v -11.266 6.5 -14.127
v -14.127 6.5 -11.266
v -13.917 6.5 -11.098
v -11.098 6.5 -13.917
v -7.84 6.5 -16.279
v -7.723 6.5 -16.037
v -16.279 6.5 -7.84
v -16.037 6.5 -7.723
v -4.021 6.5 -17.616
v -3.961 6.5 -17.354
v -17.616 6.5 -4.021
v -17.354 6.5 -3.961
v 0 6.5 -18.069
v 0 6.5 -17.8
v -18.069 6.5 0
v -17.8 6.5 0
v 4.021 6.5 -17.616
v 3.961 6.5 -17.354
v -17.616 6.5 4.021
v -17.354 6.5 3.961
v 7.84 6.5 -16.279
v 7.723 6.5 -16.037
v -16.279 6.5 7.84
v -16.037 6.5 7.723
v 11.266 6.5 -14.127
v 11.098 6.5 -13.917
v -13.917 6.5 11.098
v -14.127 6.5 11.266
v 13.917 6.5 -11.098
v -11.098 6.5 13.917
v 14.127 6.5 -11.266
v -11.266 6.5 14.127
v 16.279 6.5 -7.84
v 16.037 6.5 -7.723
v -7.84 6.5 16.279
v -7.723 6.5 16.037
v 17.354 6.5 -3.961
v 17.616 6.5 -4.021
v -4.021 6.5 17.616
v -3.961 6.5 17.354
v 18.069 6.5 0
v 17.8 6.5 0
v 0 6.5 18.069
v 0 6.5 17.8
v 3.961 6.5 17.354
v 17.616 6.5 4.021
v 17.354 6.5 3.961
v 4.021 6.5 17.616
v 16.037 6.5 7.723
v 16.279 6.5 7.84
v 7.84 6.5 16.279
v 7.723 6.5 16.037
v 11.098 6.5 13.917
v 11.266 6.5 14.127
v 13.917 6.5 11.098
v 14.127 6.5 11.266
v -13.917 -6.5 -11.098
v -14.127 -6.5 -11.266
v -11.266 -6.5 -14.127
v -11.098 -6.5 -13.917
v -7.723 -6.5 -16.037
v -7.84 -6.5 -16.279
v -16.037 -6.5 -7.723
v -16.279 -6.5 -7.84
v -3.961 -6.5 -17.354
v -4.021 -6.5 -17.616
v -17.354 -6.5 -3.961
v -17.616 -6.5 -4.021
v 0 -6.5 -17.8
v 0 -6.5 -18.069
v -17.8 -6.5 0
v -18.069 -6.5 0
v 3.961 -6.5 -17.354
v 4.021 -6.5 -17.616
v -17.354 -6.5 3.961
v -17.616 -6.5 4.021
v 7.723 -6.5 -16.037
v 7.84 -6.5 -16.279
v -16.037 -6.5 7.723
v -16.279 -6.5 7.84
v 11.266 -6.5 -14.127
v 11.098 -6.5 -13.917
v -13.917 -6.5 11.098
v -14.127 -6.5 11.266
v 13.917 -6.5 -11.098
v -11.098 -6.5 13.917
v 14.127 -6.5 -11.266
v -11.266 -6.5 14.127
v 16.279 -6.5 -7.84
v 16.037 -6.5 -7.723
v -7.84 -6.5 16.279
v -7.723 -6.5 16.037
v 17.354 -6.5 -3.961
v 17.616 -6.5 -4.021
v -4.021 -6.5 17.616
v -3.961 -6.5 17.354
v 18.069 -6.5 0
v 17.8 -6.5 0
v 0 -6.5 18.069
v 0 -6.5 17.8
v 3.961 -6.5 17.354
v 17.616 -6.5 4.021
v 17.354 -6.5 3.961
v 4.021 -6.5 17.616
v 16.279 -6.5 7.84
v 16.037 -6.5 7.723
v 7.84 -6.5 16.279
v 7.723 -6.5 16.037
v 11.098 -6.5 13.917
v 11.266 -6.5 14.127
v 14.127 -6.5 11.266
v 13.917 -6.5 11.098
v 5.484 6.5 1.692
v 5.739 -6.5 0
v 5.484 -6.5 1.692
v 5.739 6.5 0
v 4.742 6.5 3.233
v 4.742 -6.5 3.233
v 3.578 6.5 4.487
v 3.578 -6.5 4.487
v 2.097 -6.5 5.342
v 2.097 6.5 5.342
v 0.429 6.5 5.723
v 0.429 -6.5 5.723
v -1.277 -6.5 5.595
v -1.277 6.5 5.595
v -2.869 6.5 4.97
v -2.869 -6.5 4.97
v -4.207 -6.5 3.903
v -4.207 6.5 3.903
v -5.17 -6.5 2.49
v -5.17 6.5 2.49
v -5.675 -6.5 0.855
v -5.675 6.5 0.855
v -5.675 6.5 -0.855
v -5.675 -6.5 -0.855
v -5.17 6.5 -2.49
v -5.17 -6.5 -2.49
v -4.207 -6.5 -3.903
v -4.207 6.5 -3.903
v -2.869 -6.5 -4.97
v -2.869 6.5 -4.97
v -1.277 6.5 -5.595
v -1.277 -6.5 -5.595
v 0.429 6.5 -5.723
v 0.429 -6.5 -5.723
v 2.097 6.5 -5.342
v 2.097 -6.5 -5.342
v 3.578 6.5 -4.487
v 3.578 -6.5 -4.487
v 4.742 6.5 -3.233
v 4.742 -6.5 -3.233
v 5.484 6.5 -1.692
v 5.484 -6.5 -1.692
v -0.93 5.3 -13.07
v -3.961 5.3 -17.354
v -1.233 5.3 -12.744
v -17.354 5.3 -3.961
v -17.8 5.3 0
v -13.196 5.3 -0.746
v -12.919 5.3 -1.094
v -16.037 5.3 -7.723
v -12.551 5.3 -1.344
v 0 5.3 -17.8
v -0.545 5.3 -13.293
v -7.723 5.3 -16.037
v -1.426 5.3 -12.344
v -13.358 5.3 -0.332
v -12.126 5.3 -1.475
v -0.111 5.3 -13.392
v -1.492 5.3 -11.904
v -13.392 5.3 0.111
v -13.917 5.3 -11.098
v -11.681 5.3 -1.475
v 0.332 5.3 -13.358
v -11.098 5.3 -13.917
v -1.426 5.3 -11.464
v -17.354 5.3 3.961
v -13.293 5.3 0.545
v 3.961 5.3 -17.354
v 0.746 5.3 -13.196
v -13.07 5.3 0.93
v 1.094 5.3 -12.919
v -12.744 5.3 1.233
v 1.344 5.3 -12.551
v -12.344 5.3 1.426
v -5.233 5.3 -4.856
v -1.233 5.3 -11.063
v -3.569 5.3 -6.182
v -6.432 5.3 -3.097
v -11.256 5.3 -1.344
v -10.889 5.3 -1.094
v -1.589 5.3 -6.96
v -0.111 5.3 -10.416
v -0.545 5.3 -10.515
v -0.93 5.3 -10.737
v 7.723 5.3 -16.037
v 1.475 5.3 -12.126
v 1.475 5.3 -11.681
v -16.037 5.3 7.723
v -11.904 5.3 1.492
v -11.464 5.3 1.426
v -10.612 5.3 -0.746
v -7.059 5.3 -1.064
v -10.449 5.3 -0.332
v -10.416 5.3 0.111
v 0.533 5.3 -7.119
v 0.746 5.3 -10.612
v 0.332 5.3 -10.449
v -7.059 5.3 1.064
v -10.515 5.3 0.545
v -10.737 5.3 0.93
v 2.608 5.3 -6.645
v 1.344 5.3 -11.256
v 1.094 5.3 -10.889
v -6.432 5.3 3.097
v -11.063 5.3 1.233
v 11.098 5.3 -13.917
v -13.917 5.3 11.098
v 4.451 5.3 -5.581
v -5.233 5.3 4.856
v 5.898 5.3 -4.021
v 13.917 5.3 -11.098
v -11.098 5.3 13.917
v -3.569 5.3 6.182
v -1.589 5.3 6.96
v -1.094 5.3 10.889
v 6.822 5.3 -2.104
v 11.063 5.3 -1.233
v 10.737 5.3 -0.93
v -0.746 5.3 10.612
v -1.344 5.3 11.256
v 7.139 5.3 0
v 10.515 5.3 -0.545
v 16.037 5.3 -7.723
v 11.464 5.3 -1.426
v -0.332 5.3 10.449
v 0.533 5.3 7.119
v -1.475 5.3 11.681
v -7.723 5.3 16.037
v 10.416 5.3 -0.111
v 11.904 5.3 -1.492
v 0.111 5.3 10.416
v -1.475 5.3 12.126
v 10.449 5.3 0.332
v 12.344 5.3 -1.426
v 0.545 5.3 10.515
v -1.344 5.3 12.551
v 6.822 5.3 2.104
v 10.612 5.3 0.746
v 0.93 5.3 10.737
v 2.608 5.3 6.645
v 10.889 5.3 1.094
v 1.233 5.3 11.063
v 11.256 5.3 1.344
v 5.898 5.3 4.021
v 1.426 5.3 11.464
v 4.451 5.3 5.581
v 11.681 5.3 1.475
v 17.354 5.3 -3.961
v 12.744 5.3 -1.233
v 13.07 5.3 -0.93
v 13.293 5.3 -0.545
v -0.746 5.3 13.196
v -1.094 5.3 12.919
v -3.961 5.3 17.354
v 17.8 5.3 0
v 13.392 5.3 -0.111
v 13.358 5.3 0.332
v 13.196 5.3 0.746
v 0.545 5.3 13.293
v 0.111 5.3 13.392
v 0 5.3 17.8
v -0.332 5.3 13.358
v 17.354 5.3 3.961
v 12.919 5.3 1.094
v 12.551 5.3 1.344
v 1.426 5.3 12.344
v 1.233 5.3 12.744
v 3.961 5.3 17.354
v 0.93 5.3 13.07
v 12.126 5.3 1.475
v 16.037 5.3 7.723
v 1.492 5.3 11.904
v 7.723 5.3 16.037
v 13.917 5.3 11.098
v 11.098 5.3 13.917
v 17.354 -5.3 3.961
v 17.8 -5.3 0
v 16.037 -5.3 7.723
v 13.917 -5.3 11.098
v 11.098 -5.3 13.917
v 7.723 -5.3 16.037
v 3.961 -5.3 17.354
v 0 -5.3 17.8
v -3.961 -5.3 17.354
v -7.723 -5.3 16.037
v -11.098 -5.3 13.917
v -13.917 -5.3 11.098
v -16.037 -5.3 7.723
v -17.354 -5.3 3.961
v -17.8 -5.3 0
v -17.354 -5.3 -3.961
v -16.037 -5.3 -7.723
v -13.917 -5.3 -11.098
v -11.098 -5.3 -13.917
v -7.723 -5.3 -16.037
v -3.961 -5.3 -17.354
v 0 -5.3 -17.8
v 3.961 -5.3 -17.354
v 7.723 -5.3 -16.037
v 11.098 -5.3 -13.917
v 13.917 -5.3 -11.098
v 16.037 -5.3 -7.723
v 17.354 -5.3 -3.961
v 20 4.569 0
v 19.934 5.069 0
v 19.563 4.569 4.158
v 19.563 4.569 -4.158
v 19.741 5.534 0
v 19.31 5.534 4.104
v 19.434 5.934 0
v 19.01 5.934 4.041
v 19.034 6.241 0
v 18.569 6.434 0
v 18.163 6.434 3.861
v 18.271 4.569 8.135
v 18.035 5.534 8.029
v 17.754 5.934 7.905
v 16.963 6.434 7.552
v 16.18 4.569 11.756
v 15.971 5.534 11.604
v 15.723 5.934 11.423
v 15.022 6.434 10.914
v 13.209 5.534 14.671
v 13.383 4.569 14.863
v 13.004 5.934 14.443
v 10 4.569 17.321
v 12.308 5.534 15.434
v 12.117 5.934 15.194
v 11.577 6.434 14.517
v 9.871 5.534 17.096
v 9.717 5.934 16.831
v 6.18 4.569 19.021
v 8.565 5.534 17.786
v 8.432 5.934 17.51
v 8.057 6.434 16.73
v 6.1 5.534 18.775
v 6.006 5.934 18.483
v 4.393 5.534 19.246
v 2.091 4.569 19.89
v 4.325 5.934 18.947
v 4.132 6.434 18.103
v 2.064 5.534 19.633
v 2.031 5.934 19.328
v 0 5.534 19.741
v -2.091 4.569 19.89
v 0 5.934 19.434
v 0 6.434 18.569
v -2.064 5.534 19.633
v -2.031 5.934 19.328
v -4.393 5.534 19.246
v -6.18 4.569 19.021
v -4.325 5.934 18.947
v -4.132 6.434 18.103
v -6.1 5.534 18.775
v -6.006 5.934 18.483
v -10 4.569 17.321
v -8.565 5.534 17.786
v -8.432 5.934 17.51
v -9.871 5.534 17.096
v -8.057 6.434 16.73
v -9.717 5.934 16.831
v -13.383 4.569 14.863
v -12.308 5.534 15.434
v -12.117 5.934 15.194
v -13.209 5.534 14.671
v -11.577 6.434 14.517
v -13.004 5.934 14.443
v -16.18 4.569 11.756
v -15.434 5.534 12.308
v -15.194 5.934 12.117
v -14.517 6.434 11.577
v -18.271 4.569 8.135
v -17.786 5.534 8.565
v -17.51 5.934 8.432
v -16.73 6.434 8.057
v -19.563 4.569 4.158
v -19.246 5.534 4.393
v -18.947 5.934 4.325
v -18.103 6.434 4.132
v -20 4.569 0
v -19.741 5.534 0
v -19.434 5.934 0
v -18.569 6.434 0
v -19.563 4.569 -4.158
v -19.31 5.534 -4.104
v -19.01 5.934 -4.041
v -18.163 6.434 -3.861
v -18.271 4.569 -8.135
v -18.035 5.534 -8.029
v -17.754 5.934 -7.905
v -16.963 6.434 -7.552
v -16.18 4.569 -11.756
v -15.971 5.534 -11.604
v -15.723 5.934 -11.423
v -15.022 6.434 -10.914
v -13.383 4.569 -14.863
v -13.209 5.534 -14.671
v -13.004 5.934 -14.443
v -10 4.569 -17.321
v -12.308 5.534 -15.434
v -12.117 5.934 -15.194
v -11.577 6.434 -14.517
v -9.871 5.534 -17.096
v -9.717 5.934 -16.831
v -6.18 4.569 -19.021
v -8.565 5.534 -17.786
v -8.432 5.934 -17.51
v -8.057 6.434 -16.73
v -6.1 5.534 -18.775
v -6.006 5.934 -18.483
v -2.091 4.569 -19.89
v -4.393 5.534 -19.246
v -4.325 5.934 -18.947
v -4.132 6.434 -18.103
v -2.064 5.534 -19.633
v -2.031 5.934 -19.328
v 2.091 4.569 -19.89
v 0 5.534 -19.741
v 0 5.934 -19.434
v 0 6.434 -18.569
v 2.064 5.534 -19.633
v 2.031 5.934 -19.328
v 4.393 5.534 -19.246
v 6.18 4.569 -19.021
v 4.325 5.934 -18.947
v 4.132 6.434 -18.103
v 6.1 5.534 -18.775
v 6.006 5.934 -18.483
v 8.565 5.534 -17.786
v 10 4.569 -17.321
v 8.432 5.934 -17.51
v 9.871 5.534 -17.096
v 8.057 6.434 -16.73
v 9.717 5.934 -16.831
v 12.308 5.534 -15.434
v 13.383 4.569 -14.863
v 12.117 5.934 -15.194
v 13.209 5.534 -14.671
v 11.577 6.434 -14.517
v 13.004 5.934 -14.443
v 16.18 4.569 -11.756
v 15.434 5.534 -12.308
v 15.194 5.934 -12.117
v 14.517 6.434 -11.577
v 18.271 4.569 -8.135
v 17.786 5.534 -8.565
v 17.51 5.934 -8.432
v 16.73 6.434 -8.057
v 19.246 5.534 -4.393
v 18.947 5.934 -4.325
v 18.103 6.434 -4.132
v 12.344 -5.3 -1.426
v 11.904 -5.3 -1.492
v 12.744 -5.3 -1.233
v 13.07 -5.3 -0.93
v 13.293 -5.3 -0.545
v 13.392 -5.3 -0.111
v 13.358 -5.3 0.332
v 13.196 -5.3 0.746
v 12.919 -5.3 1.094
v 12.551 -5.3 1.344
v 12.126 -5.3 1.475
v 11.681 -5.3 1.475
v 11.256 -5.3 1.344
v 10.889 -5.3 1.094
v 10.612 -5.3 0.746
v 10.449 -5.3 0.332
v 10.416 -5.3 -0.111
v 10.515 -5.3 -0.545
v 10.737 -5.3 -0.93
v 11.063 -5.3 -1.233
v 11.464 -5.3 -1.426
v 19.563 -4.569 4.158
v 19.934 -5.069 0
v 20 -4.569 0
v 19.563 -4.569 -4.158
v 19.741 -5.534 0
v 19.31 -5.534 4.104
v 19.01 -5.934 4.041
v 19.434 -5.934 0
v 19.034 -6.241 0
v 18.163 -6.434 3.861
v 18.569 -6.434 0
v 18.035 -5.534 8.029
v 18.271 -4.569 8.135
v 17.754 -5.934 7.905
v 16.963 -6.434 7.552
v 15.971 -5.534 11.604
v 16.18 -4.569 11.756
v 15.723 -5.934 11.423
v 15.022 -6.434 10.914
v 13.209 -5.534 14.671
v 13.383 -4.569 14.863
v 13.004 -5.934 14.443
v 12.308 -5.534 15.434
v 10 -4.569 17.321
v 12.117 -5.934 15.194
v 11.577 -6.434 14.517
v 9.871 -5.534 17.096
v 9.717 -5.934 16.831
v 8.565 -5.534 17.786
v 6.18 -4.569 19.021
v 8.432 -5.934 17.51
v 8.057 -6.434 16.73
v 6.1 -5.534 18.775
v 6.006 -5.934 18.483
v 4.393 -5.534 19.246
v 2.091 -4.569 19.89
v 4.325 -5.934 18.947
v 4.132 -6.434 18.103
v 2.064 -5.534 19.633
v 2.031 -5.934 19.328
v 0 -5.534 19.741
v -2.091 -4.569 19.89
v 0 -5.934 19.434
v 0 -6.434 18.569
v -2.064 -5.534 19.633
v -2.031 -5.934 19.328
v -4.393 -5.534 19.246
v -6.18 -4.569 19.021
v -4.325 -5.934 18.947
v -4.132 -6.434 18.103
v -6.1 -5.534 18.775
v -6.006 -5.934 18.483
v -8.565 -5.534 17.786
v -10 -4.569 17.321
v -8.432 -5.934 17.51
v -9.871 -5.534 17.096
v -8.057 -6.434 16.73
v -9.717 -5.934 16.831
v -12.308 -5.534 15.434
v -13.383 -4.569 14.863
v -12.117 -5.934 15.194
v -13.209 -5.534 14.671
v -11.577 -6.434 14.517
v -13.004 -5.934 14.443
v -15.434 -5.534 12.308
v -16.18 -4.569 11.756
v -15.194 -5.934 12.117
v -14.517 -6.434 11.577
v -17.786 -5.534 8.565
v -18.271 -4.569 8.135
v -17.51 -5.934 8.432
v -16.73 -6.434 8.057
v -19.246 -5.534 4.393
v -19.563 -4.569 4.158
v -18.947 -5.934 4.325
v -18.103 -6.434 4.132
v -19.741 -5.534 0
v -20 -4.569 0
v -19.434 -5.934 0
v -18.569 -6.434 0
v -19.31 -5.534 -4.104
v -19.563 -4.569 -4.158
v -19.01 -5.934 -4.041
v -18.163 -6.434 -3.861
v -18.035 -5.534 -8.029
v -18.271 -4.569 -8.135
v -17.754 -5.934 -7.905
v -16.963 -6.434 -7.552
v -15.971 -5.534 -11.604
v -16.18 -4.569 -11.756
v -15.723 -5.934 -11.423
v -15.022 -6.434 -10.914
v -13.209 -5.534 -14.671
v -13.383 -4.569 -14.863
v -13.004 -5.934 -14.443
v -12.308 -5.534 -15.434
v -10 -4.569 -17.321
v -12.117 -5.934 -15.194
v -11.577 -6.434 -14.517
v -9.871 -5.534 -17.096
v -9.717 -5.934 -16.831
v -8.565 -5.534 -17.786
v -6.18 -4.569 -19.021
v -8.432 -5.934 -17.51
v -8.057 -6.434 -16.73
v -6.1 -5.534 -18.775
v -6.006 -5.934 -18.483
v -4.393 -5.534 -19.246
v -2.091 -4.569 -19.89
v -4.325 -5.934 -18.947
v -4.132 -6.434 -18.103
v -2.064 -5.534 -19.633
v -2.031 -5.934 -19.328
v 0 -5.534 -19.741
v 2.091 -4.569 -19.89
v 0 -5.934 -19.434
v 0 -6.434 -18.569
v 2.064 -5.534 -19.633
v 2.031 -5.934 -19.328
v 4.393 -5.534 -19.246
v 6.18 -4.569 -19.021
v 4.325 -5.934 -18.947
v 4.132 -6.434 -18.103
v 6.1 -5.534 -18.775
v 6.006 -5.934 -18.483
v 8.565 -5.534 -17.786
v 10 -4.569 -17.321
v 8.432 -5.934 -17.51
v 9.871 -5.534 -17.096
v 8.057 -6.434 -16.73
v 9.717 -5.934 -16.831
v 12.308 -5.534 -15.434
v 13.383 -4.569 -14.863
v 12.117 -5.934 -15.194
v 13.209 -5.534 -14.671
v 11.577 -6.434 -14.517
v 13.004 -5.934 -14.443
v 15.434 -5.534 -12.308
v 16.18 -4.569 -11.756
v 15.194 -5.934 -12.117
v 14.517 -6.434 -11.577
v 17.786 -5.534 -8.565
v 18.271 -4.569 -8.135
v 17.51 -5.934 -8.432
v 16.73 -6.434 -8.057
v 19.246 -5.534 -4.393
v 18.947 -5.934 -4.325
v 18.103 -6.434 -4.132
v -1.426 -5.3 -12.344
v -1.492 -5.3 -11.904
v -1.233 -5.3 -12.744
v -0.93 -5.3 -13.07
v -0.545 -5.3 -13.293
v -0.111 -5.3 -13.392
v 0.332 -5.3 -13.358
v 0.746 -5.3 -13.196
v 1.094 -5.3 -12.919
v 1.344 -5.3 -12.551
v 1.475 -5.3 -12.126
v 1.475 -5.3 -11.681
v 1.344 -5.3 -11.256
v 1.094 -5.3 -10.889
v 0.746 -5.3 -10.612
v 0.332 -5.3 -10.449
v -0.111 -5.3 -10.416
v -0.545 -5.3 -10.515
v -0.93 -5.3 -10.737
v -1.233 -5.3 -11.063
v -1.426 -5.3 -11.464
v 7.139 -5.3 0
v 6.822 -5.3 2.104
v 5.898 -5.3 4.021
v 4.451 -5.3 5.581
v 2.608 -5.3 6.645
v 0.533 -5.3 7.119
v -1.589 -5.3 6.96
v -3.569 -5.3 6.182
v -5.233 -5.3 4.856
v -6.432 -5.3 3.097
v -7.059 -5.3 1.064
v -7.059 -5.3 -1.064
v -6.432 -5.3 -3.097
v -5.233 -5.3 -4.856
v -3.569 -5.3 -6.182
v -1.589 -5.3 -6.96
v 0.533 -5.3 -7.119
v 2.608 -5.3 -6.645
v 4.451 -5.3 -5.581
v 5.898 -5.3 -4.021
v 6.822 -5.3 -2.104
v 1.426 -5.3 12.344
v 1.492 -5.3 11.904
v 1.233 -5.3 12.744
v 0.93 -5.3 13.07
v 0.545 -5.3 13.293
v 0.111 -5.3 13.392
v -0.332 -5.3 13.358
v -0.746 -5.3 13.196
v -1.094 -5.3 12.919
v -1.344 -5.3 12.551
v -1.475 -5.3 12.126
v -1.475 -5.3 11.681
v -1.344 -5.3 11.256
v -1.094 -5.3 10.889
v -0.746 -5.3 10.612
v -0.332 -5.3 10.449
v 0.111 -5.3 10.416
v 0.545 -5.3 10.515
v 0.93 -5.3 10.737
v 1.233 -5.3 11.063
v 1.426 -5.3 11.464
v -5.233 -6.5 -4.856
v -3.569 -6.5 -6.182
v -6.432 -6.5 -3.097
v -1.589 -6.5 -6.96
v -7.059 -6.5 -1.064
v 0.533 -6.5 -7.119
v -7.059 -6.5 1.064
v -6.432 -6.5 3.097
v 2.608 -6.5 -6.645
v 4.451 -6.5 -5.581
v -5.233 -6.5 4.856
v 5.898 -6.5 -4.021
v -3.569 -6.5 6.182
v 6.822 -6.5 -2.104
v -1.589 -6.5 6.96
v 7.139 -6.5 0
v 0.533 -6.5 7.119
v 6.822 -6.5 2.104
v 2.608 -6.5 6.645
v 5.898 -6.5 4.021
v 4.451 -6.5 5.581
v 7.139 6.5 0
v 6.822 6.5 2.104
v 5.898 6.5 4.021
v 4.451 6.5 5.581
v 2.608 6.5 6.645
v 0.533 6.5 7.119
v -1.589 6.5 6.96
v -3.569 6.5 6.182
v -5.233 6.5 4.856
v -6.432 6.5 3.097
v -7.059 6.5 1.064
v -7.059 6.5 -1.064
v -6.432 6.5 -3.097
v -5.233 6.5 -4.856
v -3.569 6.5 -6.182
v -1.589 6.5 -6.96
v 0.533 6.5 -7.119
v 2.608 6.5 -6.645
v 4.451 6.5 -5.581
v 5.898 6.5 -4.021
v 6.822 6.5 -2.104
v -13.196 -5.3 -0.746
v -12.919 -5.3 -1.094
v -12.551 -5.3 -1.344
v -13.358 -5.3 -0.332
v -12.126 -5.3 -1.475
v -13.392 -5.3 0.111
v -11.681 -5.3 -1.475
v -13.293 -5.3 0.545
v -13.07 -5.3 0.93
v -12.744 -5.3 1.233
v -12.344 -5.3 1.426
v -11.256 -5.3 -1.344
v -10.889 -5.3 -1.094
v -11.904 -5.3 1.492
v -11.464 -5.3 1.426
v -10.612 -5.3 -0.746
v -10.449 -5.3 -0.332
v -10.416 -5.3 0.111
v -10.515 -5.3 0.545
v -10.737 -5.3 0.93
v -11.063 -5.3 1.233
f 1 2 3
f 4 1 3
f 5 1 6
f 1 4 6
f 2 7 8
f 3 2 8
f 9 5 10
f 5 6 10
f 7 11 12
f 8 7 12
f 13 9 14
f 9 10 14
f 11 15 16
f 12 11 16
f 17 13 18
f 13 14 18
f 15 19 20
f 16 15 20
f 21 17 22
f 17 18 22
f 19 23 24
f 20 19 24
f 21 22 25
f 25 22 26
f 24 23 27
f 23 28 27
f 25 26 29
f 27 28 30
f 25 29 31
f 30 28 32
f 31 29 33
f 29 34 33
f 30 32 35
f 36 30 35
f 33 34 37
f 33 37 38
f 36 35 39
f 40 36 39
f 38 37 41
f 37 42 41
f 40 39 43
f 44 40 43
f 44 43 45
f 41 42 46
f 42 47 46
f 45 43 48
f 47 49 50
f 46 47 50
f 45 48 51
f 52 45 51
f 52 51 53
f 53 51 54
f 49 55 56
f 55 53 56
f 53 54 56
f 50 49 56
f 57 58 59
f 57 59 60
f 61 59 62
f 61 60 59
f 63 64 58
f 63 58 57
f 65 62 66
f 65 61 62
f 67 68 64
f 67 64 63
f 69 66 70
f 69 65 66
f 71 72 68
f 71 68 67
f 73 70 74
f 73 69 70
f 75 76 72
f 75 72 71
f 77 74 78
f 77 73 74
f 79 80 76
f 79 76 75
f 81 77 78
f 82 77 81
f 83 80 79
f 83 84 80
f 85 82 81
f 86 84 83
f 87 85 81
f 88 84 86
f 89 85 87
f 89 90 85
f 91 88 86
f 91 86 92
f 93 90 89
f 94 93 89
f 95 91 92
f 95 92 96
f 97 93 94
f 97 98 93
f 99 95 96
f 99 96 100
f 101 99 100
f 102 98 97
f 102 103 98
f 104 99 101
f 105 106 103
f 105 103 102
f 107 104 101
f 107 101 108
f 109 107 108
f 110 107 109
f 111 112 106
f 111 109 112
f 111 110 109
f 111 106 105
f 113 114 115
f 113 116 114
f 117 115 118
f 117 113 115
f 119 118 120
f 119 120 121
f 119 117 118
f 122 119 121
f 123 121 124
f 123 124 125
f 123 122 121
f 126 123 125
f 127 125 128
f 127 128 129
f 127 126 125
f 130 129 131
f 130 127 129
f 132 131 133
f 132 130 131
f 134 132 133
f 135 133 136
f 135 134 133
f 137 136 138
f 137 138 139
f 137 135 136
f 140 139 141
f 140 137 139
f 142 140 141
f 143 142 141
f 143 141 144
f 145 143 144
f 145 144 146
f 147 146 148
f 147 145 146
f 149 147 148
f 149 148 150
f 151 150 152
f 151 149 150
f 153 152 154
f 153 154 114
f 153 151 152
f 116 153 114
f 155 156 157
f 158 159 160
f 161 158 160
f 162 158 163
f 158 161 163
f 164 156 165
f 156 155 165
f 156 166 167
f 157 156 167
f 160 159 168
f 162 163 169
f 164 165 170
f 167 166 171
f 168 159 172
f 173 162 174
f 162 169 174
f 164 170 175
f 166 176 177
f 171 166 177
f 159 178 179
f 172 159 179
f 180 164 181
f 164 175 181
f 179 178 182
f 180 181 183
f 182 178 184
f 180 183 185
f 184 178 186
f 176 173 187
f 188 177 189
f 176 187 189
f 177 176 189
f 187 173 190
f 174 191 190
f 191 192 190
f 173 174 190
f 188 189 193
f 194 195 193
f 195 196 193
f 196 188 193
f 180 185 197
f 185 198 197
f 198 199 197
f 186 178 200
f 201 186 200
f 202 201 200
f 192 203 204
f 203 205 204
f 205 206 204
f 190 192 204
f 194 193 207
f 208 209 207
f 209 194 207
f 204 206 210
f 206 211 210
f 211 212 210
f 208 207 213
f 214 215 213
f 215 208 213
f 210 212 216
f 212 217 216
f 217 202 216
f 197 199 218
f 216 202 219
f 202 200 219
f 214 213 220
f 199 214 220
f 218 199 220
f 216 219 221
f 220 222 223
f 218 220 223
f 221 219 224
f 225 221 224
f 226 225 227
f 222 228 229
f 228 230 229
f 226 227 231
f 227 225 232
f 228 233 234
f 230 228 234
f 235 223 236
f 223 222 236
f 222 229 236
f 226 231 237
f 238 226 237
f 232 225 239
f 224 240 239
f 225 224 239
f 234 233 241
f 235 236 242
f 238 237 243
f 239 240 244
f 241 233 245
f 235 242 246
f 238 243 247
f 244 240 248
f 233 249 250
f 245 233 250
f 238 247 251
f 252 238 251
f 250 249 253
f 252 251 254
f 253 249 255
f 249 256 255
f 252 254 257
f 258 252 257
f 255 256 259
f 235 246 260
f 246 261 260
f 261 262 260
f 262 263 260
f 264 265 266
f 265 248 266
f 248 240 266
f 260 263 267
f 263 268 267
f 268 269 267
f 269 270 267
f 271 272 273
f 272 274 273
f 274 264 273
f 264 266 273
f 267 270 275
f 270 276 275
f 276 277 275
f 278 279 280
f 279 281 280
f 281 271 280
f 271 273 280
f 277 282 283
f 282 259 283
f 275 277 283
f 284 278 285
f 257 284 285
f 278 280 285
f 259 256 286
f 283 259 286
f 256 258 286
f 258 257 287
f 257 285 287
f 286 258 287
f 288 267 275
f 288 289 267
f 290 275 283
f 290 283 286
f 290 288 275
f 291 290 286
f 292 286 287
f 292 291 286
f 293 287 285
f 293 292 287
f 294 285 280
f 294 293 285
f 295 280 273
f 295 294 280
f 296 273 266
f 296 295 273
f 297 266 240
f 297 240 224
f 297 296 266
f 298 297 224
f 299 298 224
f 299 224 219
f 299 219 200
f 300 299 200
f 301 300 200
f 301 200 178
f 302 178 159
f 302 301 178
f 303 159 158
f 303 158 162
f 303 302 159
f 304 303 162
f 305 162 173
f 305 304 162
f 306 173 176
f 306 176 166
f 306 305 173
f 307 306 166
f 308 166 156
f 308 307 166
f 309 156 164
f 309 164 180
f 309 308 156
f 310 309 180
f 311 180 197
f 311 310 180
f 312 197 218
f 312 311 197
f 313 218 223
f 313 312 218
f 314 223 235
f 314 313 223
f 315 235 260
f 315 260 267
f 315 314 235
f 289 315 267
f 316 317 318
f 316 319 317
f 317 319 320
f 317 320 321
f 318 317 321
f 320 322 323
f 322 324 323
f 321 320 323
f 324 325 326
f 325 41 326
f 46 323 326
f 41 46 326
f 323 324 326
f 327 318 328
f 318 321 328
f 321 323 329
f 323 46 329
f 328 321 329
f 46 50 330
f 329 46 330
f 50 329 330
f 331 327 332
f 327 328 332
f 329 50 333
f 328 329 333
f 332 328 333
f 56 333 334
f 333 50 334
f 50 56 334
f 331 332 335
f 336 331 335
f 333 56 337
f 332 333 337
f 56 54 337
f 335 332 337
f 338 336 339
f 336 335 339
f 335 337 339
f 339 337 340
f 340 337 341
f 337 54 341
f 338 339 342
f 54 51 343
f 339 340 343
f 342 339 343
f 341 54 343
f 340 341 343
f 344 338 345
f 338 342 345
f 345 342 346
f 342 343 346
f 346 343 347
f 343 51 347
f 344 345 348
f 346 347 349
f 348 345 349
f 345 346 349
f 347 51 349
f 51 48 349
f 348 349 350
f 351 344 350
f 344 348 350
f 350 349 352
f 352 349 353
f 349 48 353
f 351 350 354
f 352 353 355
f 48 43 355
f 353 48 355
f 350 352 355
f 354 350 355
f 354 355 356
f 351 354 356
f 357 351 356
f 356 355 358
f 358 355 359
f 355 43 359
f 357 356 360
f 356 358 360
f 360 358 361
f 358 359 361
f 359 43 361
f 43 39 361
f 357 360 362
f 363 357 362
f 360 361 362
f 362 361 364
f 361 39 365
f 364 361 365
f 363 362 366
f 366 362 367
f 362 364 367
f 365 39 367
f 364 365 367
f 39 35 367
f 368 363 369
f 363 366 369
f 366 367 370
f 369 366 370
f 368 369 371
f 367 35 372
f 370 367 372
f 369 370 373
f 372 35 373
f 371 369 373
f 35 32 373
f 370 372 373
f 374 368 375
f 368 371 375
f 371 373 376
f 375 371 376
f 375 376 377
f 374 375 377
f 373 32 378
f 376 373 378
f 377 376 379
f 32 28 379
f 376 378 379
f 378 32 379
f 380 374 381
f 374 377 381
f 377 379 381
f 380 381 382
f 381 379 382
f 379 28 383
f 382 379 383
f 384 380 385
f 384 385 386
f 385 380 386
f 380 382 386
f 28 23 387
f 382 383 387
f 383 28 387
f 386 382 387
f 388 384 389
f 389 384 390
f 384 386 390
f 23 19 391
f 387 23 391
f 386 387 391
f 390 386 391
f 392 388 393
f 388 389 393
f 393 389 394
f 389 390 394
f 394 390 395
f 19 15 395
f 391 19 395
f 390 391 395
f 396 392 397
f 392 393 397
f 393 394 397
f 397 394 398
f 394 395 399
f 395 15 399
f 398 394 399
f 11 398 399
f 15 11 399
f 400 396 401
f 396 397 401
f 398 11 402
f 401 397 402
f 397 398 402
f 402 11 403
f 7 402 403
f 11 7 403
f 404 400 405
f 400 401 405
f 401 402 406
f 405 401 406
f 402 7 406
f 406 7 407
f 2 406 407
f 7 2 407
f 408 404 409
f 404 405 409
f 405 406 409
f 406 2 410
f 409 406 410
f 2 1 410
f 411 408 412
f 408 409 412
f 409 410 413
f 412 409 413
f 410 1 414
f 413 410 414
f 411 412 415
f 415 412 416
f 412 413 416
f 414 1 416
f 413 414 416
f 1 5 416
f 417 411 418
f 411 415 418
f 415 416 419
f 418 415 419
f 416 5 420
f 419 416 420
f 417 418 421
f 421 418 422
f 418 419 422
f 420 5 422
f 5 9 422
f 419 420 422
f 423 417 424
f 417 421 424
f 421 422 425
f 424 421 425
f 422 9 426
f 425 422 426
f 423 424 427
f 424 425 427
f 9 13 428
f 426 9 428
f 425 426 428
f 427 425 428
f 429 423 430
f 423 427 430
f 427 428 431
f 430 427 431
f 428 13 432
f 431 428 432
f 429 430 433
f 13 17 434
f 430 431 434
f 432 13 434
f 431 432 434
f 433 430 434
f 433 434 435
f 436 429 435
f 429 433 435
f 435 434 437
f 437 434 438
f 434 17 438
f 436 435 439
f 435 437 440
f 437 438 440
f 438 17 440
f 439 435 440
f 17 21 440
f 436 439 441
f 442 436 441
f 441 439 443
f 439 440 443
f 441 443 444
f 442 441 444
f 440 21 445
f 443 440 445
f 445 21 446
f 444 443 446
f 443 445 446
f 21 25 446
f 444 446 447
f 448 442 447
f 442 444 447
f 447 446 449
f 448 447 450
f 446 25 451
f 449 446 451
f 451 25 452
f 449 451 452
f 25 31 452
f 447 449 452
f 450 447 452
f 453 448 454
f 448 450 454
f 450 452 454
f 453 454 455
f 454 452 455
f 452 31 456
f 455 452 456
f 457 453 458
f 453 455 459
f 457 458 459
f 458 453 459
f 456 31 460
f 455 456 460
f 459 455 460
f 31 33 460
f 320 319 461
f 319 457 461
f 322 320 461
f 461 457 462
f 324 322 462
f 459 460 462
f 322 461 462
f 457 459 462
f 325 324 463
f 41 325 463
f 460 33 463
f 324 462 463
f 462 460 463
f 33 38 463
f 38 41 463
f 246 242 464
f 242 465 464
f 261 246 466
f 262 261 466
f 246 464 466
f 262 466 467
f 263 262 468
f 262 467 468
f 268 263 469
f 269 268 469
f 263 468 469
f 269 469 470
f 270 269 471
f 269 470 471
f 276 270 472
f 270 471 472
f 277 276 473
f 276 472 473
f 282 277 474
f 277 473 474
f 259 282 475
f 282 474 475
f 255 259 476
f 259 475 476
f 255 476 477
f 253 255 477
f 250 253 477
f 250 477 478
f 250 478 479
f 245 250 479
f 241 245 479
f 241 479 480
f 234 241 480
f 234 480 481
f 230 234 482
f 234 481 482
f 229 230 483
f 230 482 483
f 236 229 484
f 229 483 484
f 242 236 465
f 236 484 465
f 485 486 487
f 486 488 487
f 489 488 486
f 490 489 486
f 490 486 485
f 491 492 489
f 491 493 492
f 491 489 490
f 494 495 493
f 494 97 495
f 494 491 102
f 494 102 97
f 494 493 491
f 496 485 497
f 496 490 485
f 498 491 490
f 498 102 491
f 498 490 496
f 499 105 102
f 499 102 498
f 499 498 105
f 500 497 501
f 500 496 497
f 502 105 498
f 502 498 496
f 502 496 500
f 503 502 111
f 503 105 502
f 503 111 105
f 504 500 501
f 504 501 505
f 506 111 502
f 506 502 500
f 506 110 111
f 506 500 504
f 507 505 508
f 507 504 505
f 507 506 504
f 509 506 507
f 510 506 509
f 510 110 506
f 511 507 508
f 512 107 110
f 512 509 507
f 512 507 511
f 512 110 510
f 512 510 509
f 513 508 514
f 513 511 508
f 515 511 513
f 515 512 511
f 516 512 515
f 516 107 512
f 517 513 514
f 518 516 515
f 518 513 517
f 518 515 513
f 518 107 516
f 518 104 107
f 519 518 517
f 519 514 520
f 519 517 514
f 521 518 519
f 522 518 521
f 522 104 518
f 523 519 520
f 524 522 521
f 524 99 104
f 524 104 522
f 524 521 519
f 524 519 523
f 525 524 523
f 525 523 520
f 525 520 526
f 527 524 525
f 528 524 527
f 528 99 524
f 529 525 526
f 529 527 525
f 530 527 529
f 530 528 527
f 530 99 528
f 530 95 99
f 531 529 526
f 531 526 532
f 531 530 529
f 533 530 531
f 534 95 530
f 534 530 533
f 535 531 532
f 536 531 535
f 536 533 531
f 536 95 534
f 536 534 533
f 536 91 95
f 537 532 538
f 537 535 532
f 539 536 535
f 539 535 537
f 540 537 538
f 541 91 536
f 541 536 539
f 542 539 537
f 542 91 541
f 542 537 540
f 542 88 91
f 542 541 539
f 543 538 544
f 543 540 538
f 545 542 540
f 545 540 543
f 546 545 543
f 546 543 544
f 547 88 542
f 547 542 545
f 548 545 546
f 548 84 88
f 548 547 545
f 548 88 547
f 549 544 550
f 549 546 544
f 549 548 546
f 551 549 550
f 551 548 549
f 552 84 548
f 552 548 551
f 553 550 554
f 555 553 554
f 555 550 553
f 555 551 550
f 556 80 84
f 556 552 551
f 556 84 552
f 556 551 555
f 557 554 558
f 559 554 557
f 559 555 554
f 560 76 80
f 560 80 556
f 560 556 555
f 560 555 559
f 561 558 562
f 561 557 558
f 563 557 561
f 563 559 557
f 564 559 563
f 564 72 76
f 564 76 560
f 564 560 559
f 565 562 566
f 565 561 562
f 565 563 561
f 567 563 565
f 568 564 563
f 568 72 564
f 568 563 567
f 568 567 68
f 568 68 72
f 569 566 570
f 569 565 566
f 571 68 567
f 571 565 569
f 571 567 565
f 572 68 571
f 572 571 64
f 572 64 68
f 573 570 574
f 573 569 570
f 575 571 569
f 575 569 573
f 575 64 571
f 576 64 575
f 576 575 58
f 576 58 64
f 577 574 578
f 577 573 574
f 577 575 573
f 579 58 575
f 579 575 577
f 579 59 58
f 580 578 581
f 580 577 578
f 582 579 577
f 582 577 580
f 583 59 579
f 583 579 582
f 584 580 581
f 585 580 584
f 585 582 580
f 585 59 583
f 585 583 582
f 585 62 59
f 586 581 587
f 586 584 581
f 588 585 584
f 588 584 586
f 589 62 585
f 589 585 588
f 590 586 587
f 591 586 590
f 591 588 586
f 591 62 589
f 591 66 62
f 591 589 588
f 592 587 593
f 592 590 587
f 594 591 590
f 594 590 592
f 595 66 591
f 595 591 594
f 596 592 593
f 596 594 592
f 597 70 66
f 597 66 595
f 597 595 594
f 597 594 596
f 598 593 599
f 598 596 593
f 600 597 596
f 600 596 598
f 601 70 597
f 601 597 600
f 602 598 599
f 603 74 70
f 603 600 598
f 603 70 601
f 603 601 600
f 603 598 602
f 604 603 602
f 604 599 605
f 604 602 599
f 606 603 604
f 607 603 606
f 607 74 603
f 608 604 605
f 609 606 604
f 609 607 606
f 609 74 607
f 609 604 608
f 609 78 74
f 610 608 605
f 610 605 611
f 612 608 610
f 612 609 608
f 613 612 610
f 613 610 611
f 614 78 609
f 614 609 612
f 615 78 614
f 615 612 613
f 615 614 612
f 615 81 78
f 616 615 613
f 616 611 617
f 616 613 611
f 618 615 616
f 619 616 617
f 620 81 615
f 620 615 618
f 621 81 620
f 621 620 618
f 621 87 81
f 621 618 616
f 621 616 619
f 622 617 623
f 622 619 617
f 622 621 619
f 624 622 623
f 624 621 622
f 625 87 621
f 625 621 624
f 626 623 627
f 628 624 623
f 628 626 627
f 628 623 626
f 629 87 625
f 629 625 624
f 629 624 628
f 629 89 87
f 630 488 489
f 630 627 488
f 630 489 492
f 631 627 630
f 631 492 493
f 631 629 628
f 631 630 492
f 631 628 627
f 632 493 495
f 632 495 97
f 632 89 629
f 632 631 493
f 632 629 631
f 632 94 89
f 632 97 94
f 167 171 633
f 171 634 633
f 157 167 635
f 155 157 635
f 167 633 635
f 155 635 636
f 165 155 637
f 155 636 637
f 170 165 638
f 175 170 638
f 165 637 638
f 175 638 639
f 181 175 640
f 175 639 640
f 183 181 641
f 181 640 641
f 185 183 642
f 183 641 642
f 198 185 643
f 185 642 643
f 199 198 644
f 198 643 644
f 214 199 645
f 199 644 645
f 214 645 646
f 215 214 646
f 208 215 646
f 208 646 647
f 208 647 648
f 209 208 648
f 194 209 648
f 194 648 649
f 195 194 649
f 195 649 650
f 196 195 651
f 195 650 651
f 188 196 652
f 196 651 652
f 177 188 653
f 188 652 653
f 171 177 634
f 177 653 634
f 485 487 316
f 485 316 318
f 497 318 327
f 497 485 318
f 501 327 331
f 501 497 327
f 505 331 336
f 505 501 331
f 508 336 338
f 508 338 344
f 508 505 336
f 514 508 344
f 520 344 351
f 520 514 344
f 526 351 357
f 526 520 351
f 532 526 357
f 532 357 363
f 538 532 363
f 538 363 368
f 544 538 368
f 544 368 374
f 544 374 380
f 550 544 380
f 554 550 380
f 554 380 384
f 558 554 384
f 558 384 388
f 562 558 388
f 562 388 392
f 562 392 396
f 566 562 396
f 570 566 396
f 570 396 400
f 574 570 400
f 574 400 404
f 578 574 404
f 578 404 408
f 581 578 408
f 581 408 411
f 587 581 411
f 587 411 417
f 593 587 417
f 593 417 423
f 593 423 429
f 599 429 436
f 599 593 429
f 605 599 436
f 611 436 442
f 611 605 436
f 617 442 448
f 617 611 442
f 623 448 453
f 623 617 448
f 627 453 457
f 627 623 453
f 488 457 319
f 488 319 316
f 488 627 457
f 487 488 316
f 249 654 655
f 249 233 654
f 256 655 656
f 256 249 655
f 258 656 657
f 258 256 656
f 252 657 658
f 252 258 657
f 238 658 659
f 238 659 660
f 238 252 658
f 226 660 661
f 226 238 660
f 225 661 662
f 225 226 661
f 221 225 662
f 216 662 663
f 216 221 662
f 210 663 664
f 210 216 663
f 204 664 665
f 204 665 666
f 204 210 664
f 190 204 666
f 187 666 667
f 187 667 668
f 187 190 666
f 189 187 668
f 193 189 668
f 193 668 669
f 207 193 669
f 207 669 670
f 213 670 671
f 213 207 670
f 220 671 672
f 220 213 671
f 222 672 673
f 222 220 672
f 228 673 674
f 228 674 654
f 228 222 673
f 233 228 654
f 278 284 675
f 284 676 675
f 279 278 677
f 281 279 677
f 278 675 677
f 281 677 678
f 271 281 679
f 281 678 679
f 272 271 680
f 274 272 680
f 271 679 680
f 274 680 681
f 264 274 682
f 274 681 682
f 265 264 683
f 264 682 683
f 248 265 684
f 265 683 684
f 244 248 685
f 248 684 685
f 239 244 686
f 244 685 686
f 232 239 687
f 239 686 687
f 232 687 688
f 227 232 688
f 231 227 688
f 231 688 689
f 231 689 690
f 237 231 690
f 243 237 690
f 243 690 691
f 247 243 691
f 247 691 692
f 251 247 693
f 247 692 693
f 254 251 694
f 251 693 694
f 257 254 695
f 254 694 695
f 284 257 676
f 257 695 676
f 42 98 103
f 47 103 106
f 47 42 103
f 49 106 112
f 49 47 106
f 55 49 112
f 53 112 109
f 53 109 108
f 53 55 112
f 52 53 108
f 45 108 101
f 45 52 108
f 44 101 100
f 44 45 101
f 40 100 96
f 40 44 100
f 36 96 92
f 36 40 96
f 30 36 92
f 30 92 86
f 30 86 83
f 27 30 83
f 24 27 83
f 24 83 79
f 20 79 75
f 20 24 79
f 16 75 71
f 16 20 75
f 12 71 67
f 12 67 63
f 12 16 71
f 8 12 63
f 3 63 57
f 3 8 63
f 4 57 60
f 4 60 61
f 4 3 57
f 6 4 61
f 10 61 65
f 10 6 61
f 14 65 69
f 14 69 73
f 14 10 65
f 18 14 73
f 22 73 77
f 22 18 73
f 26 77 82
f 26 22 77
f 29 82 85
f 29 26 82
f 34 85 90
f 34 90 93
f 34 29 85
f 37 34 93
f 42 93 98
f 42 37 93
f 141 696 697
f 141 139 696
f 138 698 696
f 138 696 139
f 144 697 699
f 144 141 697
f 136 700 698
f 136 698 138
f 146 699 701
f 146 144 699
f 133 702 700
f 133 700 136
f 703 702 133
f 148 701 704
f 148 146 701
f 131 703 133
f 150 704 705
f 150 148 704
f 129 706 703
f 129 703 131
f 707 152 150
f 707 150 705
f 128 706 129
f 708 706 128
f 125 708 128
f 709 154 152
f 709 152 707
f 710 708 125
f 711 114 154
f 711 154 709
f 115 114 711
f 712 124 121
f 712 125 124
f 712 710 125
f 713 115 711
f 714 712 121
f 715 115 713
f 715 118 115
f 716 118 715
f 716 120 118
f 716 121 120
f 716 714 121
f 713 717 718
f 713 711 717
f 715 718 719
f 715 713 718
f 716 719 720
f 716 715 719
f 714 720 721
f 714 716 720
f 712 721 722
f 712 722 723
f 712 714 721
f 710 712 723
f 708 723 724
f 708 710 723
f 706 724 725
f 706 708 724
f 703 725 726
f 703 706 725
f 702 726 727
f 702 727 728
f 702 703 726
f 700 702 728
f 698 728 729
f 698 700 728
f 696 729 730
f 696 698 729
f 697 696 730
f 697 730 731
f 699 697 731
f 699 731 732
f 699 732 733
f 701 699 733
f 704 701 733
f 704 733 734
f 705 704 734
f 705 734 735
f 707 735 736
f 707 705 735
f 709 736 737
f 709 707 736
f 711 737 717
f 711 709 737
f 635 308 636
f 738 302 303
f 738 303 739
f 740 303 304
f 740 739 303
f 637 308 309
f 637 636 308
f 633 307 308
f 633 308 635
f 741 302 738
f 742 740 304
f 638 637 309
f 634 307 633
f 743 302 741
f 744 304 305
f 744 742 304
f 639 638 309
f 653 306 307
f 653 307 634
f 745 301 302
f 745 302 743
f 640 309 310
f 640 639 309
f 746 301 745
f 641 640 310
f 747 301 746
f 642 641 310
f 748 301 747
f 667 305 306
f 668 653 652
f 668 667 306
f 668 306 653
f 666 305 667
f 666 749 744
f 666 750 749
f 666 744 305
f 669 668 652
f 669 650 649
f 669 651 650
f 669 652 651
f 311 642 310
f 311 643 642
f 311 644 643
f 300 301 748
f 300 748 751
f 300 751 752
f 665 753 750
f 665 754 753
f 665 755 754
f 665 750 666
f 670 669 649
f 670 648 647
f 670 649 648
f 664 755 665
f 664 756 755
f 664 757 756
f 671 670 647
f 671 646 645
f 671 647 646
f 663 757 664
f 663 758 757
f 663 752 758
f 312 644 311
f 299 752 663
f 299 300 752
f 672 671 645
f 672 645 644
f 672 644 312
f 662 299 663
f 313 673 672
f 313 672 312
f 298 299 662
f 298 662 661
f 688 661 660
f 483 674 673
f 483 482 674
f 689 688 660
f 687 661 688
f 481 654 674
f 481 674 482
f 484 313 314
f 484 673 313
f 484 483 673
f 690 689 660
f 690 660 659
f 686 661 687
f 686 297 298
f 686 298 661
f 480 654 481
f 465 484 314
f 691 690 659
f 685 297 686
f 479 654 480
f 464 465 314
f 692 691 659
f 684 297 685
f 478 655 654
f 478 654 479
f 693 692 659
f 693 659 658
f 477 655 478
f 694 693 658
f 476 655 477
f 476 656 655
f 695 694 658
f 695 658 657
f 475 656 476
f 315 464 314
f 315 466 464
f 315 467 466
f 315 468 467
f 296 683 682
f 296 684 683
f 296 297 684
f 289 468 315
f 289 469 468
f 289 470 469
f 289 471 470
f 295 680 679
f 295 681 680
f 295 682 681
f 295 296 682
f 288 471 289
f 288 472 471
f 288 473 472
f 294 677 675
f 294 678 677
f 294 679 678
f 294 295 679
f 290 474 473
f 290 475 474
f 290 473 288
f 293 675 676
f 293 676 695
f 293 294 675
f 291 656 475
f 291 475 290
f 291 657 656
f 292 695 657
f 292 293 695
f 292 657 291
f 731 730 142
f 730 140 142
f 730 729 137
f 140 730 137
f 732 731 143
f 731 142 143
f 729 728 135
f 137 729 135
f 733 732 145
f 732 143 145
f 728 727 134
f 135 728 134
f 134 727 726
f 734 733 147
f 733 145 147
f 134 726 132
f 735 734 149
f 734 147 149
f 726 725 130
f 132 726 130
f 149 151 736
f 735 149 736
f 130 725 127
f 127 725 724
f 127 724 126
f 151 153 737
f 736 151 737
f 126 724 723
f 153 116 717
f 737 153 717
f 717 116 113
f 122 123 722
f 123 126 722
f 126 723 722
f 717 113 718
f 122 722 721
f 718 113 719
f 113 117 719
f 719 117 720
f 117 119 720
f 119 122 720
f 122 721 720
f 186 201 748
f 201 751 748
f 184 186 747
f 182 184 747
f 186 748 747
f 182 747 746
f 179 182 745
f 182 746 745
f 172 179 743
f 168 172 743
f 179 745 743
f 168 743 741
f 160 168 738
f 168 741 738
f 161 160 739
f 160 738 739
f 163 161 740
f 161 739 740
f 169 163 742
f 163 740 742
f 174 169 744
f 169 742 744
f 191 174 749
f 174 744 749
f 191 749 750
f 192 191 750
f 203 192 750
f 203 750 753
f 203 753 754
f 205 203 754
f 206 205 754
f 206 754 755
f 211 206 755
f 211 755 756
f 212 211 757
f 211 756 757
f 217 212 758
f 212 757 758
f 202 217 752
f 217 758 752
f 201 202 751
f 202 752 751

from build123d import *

# Parameters (mm, degrees)
F0_R     = 7.1388147771
F0_R_2   = 5.738815
F1_DEPTH = 6.5
F0_R_3   = 20
F0_R_4   = 17.7999995649
F2_DEPTH = 5.3
F3_R     = 1.9313708499
F4_R     = 1.4920329347
F5_DEPTH = 12.5
F6_COUNT = 4


with BuildPart() as f1:
    # F0 (on Front) → F1 (new body, symmetric)
    with BuildSketch(Plane.XZ):
        Circle(F0_R)
        Circle(F0_R_2, mode=Mode.SUBTRACT)
    extrude(amount=F1_DEPTH, both=True)


with BuildPart() as f1b:
    # F0 (on Front) → F1, piece 2 (new body, symmetric)
    with BuildSketch(Plane.XZ):
        Circle(F0_R_3)
        Circle(F0_R_4, mode=Mode.SUBTRACT)
    extrude(amount=F1_DEPTH, both=True)

    # F3
    f3_edges = [f1b.edges().sort_by_distance(p)[0] for p in [
        (-20, -6.5, 0),
        (-20, 6.5, 0),
    ]]
    fillet(f3_edges, radius=F3_R)


with BuildPart() as f2:
    # F0 (on Front) → F2 (new body, symmetric)
    with BuildSketch(Plane.XZ):
        Circle(F0_R_4)
        Circle(F0_R, mode=Mode.SUBTRACT)
    extrude(amount=F2_DEPTH, both=True)

    # F4 (on face) → F5 (cut, symmetric)
    with BuildSketch(Plane.XZ.offset(6.5)):
        with Locations((0, 11.9037220751)):
            Circle(F4_R)
    f5 = extrude(amount=F5_DEPTH, both=True, mode=Mode.SUBTRACT)

    # F6: F5 ×4 about axis
    f6_axis = Axis((0, 0, 0), (0, 1, 0))
    for i in range(1, F6_COUNT):
        add(f5.rotate(f6_axis, i * 360 / F6_COUNT), mode=Mode.SUBTRACT)


solid = Compound([f1.part, f1b.part, f2.part])
